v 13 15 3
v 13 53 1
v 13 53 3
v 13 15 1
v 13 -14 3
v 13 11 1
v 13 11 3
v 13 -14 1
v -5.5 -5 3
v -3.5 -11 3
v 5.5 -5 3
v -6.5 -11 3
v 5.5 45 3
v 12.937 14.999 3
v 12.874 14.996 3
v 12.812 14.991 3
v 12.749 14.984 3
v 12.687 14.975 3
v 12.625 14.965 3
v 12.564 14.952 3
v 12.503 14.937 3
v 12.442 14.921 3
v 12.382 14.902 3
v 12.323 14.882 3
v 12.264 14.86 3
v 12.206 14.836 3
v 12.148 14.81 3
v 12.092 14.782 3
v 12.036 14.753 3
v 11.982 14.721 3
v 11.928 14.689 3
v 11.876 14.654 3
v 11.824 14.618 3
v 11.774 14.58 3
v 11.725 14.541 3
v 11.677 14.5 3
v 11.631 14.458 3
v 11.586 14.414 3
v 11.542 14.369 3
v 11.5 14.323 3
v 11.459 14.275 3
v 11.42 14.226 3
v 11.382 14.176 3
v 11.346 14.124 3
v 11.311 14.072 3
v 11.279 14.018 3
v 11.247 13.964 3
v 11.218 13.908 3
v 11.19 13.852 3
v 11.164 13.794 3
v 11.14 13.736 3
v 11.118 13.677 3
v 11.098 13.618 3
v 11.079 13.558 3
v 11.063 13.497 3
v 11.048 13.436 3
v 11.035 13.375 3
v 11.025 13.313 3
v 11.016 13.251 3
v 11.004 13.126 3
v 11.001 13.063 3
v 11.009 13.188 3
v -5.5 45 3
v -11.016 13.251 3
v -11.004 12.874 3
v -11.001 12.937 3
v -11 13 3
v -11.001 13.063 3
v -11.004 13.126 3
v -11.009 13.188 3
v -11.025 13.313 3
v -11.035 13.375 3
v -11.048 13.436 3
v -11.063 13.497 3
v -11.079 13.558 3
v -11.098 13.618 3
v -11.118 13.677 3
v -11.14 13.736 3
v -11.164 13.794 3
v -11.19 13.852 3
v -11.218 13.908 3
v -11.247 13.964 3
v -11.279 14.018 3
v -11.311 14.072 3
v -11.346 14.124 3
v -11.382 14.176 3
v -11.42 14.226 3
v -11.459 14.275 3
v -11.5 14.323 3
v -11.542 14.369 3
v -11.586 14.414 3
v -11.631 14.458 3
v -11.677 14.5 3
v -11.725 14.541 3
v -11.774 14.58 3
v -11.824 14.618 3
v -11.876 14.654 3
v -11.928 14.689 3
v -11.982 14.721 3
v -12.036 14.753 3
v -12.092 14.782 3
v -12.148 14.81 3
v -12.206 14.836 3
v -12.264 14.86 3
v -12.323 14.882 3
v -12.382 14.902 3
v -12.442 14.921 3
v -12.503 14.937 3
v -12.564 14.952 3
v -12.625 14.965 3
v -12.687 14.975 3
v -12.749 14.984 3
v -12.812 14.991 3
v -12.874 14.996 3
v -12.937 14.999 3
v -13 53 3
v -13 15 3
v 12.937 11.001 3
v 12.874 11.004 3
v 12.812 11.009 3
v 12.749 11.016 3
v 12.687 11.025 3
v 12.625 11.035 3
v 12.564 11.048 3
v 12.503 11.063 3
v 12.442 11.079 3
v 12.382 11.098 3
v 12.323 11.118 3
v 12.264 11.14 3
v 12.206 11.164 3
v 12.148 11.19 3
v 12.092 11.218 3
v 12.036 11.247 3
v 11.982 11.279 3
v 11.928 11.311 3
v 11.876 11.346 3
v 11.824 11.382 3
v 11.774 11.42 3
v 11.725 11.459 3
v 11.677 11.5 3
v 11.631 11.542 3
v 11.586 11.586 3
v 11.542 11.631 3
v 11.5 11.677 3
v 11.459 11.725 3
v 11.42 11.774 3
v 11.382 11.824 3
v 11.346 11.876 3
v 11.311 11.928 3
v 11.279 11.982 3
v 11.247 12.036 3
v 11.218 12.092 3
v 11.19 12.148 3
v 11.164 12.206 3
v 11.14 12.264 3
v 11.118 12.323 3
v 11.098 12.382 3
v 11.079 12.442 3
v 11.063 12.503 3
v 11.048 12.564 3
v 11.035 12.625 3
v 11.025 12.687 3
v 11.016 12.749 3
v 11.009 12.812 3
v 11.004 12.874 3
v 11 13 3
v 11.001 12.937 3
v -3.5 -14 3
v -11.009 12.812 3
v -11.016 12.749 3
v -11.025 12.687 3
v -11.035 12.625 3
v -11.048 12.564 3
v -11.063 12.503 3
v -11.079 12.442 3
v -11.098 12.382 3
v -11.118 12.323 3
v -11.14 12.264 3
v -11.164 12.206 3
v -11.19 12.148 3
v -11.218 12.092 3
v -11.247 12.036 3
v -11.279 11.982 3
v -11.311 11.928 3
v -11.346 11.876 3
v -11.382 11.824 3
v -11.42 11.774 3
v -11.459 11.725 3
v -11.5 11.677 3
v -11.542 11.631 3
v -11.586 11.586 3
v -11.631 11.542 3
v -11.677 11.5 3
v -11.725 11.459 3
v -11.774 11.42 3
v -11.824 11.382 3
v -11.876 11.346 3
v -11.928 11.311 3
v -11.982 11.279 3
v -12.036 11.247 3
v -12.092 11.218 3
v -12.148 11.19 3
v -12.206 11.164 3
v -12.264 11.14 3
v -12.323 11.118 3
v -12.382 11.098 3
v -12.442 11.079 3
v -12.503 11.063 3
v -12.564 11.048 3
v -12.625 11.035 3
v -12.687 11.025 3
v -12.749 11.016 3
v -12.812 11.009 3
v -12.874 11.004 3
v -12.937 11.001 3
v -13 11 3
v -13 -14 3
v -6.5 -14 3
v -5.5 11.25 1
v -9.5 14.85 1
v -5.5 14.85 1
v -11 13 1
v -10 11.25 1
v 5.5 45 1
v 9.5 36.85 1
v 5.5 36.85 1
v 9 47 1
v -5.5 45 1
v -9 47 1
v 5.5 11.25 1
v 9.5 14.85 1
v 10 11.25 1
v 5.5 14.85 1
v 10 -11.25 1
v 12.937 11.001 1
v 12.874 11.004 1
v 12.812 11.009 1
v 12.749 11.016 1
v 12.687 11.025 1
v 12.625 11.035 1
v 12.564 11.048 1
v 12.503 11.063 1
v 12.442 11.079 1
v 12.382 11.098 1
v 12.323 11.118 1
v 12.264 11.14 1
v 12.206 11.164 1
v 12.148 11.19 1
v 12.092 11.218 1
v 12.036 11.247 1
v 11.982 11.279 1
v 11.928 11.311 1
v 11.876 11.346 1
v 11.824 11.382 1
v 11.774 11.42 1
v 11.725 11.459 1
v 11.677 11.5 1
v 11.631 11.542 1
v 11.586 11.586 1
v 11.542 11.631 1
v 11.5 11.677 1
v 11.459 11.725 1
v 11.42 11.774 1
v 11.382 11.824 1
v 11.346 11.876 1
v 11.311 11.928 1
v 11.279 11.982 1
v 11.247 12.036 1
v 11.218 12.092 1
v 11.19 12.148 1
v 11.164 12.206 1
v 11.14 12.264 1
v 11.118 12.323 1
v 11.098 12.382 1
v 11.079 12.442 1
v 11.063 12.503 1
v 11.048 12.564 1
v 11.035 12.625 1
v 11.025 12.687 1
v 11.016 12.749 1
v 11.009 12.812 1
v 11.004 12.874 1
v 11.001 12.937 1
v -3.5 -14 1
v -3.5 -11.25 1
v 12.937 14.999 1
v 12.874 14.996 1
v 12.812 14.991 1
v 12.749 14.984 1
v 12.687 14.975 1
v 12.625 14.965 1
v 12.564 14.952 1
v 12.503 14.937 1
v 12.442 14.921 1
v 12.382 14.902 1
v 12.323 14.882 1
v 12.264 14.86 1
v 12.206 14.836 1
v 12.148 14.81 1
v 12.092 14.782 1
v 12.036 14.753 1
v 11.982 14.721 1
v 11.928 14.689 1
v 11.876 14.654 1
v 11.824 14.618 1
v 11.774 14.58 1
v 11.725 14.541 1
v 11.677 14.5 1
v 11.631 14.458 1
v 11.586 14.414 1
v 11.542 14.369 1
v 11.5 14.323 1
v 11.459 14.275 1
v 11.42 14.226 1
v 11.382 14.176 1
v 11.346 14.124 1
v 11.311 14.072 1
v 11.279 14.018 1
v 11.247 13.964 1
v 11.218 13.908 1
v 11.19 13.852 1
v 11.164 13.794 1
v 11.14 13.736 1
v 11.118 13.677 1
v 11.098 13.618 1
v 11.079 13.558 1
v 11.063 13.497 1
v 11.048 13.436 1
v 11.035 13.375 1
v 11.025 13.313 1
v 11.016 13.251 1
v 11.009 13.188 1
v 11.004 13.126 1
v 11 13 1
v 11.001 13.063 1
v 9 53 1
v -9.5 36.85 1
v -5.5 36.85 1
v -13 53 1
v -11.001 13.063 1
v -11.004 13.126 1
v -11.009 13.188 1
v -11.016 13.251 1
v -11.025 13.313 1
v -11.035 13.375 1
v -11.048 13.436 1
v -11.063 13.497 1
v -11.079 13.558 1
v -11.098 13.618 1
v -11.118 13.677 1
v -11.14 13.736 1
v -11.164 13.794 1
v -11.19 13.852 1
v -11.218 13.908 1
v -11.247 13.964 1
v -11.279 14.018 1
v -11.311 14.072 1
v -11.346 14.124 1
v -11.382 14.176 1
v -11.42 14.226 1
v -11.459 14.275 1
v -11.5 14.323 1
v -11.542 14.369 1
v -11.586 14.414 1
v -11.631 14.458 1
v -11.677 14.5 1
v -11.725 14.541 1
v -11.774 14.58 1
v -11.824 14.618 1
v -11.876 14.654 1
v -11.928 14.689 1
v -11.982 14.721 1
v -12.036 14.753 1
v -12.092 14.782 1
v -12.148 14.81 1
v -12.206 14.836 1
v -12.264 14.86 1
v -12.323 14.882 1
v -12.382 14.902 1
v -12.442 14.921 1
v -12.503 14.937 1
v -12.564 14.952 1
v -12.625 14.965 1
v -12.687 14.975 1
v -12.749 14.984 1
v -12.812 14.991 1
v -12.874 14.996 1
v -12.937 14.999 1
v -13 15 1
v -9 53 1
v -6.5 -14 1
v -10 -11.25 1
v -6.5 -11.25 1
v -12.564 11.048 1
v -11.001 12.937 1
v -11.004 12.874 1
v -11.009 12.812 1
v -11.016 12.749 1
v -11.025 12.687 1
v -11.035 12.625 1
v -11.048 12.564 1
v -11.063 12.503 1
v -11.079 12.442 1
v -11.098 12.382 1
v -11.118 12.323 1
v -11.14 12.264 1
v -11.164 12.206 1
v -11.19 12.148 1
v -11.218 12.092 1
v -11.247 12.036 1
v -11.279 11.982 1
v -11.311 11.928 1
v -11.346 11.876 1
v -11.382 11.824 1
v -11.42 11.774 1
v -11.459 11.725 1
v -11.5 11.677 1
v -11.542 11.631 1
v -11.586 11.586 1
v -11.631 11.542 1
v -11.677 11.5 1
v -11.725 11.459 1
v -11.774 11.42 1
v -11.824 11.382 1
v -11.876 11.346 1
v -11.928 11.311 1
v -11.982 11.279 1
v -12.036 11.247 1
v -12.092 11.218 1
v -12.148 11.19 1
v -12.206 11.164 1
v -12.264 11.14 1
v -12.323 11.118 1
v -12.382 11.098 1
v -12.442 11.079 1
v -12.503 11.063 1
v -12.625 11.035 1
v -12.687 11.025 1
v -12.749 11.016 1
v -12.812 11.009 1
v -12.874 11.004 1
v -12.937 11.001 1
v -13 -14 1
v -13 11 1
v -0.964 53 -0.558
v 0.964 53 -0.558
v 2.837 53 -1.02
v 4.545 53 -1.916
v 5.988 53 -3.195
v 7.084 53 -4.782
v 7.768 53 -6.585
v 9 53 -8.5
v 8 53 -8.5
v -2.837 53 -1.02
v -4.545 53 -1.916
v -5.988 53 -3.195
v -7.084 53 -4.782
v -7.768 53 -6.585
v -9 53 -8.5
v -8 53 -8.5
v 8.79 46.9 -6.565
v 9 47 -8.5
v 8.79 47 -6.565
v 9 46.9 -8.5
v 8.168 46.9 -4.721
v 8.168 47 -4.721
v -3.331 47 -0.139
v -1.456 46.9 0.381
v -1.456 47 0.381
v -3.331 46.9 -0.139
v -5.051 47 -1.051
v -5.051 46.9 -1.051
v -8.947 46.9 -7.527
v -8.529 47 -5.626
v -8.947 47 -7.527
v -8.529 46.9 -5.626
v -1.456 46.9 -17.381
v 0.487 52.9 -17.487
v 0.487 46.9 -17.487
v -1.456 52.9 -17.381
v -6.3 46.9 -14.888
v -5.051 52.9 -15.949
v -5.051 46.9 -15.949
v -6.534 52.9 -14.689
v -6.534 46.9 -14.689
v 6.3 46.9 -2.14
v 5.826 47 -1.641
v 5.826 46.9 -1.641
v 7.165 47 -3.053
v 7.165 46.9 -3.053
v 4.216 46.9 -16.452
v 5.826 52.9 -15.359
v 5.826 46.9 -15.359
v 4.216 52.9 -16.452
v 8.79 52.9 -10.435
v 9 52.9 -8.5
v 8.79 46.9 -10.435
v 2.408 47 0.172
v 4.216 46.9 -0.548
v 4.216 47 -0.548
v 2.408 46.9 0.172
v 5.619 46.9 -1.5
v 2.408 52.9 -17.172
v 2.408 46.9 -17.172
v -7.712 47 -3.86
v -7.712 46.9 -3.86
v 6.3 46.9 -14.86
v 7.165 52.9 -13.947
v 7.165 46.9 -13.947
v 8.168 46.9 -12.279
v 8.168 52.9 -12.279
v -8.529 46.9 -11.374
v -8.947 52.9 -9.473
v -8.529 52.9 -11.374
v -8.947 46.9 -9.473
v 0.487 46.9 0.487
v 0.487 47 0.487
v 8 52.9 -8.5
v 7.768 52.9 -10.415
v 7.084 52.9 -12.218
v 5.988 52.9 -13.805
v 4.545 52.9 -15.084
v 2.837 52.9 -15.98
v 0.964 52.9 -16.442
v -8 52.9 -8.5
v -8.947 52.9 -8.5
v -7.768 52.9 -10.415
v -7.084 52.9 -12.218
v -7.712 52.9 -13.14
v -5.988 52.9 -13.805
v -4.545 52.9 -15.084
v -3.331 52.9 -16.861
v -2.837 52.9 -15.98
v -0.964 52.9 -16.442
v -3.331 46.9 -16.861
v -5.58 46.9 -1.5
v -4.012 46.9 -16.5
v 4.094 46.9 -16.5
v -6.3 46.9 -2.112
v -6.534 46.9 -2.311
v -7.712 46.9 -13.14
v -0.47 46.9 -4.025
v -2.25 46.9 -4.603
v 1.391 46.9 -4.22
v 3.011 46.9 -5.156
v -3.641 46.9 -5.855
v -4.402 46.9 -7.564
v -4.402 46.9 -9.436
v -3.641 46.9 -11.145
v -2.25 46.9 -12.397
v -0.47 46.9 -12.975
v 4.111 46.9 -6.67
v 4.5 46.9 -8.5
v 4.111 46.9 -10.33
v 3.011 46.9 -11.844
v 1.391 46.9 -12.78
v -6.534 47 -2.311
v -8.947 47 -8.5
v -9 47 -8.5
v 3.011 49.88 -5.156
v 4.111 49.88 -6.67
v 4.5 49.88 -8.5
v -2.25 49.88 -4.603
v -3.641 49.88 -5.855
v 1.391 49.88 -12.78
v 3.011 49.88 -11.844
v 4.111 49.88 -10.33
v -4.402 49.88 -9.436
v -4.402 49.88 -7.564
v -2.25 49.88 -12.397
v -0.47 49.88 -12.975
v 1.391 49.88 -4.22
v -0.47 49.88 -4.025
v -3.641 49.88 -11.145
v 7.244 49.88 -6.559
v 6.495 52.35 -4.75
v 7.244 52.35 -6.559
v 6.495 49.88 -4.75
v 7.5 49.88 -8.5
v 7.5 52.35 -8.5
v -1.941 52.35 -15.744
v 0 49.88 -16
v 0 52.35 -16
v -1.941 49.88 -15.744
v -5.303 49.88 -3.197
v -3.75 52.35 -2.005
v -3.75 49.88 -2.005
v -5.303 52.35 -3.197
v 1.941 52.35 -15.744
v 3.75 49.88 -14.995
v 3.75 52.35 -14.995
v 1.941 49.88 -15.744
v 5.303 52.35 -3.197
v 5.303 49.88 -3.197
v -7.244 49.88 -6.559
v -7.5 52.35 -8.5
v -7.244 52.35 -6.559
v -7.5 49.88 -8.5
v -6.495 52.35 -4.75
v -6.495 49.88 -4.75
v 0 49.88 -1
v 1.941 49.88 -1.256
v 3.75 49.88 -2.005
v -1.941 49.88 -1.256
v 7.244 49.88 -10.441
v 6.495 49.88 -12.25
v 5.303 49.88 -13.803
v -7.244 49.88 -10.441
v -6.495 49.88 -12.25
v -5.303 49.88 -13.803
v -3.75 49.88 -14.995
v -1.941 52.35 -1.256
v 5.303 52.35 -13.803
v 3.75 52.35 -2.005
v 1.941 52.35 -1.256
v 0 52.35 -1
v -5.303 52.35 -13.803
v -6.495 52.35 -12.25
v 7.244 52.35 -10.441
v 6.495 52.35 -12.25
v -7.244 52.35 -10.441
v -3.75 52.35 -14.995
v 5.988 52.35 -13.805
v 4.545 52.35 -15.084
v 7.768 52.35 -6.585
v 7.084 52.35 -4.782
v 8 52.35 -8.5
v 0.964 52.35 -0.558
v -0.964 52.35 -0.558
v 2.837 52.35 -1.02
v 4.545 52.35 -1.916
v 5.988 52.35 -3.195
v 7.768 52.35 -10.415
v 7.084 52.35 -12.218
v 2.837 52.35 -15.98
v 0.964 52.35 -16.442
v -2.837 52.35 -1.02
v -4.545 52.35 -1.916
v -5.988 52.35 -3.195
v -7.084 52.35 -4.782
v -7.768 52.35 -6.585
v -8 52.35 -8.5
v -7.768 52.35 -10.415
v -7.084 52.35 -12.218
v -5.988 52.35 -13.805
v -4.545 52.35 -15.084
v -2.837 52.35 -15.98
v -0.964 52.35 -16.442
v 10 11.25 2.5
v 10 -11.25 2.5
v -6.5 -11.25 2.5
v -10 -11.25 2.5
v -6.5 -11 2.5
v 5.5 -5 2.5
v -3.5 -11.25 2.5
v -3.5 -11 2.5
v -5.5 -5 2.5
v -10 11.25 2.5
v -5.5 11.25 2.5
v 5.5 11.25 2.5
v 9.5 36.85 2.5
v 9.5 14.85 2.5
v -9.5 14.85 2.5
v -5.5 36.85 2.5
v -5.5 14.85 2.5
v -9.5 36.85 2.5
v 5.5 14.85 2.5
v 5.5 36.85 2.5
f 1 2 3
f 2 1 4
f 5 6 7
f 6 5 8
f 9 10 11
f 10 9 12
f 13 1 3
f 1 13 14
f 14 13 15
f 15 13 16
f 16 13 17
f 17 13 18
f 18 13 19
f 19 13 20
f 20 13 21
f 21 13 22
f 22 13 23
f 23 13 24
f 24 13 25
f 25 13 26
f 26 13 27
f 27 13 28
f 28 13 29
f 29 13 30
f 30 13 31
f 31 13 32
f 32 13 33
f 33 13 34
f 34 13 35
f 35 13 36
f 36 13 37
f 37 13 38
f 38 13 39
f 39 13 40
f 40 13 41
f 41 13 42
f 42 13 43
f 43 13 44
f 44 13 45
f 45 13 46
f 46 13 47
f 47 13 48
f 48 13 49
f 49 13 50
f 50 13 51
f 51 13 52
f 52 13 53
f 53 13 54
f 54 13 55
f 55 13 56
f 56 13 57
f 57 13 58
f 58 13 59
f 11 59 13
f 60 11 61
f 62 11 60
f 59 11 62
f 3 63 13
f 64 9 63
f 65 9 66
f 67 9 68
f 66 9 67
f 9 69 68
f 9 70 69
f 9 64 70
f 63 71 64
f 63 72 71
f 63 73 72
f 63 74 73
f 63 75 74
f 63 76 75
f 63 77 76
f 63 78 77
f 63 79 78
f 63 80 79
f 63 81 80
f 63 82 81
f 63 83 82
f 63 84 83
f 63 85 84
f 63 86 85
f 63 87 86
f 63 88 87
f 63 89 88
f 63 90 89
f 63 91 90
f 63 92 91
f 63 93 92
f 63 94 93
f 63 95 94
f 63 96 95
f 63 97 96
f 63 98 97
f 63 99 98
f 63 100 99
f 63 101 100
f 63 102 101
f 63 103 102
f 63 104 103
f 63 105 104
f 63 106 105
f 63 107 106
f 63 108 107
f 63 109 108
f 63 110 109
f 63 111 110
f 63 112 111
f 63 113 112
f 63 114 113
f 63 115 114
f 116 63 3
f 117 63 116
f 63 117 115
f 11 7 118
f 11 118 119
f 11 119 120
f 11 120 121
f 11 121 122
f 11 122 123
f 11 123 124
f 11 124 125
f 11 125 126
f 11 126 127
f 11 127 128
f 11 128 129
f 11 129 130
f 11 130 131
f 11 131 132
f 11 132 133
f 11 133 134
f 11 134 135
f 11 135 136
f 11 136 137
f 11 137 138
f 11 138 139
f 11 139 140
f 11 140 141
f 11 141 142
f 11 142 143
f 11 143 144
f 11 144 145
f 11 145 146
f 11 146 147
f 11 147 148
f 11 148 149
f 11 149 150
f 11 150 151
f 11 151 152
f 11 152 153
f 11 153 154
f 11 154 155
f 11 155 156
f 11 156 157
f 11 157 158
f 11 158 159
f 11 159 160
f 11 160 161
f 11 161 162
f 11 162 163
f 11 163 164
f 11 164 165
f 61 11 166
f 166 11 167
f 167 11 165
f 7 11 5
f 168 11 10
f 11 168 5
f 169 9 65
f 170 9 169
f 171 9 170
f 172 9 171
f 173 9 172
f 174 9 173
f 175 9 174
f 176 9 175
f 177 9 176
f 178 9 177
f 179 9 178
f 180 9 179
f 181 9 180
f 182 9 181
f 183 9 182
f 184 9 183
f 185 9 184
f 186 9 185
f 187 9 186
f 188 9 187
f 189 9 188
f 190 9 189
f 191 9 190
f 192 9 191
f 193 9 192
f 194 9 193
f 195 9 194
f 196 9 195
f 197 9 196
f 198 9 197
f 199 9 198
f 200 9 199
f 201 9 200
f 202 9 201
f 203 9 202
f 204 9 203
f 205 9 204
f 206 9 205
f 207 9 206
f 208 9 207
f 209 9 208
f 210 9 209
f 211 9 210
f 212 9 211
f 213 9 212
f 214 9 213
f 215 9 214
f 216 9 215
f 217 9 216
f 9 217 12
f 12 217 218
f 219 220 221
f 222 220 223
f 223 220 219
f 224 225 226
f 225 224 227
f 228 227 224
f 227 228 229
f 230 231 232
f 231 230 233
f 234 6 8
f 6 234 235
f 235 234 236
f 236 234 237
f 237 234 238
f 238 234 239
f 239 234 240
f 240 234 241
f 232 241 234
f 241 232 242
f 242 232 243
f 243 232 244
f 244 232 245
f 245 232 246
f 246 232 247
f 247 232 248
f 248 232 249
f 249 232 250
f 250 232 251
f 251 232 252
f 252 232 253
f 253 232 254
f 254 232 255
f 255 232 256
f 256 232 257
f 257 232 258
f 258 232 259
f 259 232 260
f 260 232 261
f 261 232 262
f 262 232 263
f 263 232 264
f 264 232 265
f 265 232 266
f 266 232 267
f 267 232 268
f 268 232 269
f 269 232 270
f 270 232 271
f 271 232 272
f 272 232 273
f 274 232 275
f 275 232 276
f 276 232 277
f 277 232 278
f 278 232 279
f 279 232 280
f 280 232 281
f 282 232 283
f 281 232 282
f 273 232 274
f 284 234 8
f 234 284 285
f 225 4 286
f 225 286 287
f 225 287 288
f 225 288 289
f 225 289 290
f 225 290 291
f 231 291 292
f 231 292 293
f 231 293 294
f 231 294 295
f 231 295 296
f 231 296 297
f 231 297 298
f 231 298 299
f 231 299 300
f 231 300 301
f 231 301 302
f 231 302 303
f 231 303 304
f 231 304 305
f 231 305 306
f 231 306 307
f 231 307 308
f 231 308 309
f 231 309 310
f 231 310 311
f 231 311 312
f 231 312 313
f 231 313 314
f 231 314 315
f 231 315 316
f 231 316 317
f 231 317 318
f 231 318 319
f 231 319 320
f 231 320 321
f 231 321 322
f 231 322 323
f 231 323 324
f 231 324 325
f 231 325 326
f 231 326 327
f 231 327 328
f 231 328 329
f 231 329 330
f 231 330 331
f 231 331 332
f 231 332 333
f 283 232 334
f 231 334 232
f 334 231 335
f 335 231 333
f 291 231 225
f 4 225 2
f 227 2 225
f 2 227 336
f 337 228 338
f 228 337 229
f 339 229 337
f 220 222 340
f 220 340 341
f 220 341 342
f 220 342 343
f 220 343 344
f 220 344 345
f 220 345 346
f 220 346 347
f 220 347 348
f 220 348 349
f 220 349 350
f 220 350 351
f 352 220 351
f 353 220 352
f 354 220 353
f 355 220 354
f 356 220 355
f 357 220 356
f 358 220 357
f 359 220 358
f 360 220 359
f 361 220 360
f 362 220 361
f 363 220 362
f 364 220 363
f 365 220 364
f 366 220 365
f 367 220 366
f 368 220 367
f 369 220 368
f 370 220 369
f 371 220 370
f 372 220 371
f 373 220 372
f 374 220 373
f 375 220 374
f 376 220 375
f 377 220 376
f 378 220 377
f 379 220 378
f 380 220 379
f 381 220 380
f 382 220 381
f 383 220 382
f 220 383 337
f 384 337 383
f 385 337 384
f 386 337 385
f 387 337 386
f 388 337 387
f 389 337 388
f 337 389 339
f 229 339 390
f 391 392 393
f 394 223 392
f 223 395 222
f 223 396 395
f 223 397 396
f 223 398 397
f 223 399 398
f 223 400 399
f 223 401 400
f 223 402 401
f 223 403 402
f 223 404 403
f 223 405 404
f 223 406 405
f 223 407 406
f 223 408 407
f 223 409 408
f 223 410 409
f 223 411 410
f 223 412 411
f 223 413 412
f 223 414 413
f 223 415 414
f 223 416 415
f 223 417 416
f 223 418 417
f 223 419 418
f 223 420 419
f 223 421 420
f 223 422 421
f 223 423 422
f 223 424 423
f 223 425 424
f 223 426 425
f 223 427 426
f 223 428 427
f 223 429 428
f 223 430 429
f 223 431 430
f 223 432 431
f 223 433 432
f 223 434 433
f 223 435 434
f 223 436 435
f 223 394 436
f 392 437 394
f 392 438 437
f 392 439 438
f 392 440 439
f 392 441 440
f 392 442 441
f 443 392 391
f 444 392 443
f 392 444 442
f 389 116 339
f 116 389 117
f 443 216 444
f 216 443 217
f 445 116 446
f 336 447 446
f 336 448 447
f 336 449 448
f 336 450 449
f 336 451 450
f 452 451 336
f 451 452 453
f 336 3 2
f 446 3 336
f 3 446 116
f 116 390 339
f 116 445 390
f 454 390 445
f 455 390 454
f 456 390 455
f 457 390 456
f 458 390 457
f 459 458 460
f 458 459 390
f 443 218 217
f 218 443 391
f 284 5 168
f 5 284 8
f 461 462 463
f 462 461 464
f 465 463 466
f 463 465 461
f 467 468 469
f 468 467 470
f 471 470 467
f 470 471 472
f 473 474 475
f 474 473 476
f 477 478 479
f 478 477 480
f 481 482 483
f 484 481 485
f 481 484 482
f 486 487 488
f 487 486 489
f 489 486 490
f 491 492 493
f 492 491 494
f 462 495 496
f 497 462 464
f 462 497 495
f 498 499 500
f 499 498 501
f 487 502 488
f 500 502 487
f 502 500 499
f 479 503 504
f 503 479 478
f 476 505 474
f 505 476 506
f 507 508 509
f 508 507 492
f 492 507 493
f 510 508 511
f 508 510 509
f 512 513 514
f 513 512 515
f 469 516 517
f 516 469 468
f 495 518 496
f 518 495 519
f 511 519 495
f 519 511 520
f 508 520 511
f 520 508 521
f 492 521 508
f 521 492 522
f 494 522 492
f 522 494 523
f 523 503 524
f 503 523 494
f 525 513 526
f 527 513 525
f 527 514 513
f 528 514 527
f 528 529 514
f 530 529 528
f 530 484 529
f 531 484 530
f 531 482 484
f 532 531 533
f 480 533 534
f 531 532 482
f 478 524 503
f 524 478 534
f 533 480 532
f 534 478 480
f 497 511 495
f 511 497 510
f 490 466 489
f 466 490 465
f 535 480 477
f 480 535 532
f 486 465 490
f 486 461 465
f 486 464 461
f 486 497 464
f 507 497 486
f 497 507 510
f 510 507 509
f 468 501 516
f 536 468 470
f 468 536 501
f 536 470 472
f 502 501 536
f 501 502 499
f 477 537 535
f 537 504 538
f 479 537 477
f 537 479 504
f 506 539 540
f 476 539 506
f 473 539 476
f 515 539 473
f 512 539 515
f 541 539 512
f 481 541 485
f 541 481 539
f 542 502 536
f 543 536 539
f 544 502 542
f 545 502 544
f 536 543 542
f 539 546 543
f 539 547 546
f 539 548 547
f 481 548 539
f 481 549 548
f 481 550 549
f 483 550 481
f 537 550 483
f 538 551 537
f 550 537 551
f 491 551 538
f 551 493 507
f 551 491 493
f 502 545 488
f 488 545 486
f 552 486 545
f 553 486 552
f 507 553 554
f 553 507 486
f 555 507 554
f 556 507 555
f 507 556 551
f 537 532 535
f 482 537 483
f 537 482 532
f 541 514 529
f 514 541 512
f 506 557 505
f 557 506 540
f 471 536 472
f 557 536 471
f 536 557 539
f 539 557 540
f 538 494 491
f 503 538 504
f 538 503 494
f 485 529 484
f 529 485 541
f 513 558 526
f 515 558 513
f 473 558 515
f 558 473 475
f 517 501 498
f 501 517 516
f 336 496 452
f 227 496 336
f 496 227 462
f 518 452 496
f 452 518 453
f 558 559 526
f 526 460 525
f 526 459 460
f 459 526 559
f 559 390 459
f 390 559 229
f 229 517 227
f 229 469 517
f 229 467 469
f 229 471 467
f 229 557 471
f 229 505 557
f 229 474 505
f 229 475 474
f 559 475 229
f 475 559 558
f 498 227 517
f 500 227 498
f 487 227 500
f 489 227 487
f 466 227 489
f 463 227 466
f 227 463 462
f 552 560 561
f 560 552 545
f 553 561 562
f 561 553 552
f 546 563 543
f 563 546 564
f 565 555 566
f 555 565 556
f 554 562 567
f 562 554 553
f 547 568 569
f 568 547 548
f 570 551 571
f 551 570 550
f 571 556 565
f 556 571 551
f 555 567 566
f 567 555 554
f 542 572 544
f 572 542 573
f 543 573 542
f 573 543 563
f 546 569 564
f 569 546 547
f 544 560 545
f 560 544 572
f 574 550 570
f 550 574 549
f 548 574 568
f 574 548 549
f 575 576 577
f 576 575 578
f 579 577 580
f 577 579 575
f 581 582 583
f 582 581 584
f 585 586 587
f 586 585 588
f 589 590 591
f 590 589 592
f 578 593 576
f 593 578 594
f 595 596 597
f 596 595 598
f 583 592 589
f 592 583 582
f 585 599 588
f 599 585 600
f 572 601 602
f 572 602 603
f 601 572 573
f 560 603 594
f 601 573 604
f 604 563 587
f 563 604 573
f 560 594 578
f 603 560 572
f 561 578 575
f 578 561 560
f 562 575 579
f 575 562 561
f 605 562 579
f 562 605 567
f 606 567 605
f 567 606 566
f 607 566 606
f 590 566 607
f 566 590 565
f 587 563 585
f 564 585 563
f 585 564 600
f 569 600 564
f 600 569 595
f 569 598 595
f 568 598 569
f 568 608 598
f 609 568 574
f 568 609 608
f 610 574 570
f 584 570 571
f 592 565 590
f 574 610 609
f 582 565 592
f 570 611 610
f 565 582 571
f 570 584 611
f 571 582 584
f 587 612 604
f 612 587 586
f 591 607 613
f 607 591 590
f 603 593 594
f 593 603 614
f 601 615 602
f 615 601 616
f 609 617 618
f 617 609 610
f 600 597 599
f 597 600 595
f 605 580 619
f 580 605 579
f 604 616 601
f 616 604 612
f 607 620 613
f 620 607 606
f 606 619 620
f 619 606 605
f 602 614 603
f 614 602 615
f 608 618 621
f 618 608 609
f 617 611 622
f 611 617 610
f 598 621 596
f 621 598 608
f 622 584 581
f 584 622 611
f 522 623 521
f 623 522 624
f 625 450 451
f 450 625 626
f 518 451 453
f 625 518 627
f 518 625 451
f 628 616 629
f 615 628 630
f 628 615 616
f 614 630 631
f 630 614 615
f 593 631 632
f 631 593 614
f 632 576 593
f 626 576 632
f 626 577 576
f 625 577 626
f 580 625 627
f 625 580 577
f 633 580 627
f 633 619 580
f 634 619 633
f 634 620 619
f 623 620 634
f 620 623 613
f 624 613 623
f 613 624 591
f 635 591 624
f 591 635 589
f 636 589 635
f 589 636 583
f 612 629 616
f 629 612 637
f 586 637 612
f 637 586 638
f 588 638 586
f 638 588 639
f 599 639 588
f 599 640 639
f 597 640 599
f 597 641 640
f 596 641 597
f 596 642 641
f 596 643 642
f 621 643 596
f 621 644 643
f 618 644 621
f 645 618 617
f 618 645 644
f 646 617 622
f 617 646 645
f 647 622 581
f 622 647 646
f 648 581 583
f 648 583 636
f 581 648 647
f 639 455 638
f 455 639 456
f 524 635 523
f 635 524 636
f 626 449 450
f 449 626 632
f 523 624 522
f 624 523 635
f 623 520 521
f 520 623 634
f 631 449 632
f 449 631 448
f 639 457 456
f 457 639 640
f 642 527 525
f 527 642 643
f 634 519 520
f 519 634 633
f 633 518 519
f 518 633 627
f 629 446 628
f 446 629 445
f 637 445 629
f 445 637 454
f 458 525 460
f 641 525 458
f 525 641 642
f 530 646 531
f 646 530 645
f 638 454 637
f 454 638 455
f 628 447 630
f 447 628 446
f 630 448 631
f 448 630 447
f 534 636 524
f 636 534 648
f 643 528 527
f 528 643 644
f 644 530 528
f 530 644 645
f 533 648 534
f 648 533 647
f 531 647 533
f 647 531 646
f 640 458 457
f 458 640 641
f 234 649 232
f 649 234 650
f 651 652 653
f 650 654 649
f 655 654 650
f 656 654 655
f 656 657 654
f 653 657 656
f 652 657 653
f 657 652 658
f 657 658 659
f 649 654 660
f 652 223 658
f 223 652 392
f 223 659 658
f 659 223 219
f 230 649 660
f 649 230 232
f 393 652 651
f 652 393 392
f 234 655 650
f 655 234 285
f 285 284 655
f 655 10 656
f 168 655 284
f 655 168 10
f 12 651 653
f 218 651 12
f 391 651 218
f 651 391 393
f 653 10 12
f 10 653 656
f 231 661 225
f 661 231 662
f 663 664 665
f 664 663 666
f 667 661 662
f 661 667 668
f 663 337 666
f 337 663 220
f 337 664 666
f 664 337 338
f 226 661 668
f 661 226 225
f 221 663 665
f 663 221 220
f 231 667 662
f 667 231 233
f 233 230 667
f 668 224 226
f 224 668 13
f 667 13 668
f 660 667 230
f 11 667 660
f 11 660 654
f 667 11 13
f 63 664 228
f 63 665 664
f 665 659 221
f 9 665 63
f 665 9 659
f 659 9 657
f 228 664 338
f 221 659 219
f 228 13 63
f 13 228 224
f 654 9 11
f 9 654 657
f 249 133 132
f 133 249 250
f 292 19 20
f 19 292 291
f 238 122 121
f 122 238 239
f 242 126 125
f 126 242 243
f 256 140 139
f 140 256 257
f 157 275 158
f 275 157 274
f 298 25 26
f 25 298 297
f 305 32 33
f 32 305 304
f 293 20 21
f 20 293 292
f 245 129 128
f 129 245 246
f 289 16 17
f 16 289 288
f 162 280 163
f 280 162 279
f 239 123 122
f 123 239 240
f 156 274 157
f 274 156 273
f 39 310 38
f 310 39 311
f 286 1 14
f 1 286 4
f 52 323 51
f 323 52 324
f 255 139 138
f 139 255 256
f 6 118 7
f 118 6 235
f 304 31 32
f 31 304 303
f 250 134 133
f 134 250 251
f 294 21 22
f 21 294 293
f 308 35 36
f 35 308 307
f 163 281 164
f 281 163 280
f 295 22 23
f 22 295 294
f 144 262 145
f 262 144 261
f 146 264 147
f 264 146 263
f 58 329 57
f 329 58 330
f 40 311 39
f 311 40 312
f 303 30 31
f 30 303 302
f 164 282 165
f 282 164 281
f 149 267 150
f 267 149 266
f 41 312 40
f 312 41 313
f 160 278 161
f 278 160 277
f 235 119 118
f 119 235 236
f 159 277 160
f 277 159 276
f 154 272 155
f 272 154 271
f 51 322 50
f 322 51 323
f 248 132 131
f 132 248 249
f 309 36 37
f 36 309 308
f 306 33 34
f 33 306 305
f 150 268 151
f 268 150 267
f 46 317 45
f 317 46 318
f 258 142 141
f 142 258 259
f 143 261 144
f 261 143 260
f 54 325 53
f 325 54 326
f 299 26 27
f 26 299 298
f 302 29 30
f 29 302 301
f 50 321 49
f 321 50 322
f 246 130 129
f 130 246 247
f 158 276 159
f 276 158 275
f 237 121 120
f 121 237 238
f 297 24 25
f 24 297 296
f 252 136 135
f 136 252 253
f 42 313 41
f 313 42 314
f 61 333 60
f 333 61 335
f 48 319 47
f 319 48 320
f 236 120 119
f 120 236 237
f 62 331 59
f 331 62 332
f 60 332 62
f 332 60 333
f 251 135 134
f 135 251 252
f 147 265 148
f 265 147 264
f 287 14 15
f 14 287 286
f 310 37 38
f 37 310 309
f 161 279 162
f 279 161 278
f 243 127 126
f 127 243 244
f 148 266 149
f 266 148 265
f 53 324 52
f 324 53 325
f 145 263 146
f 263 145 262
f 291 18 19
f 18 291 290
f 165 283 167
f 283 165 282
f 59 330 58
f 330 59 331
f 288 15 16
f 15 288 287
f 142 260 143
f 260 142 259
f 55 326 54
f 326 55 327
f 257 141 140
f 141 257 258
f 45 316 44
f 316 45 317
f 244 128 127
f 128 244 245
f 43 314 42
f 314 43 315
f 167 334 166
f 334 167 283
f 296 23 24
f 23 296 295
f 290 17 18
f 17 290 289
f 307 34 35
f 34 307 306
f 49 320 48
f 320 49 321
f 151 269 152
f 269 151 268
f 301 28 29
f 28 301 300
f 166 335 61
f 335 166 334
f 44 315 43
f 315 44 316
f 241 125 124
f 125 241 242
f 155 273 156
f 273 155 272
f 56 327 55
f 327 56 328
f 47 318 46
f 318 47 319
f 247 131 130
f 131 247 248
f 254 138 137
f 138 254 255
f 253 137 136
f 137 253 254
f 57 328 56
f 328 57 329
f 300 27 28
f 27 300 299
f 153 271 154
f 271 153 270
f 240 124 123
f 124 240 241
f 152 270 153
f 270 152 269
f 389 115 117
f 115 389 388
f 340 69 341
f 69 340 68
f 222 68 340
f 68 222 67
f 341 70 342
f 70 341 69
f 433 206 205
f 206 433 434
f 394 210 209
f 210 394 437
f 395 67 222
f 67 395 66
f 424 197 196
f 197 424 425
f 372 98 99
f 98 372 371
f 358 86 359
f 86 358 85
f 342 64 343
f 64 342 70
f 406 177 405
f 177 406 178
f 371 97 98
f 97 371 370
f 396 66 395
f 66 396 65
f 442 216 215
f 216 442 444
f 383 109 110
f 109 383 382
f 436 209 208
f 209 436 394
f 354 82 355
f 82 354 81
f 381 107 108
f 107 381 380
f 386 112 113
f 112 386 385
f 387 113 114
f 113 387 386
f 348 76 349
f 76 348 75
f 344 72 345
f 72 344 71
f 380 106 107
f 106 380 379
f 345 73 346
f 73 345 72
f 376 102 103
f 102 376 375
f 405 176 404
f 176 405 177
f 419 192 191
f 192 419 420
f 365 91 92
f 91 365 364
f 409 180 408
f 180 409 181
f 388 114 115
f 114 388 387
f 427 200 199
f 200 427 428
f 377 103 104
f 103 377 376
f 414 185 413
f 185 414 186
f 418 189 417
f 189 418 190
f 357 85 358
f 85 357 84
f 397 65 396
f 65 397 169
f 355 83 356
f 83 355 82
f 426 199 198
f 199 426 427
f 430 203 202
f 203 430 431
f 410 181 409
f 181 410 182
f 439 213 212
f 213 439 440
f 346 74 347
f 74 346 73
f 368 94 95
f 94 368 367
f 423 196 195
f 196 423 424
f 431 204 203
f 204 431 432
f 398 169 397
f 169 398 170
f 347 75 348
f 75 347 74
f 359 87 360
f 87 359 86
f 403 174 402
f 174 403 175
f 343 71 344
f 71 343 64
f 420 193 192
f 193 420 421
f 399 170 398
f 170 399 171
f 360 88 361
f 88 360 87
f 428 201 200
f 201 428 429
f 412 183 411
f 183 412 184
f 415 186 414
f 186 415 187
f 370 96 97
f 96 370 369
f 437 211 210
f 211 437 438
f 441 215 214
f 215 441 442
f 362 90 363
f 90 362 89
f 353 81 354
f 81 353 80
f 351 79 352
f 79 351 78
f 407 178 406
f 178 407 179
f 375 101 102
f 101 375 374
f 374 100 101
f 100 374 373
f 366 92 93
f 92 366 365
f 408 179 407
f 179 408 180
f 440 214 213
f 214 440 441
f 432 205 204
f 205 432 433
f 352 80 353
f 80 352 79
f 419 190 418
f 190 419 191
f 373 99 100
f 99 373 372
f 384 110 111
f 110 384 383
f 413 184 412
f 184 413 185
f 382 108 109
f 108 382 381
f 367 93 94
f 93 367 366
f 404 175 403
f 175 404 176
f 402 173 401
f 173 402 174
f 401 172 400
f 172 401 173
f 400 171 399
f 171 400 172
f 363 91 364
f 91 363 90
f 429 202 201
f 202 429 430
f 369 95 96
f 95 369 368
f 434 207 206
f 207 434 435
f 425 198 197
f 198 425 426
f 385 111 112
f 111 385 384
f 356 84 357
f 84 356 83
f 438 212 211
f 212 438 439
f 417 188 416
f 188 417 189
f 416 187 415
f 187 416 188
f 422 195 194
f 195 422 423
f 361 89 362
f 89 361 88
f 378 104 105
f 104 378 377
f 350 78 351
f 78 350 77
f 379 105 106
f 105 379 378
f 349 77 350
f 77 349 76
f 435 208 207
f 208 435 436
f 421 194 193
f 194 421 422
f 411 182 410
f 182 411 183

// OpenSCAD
module parts() {
	color([0.5,0.7,0.7]){
		cube([20,22.5,5], center=true);
		translate([-5,-17,0.5])cube([3,12,6], center=true);
		translate([0,22.25+3.6,0])cube([19,22,5], center=true);
		
		//camera
		translate([0,0,-4])union(){
			translate([0,39.9+4,-5])cube([12.6, 6, 15], center=true);
			translate([0,39.9+10,-4.5])rotate([90,0,0])cylinder(r=4.5,h=3.10);
		}

		translate([0,0,-4])union(){
			translate([0,39.9+12.48,-4.5])rotate([90,0,0])cylinder(r=15/2,h=2.5);
			translate([0,39.9+15.45,-4.5])rotate([90,0,0])cylinder(r=16/2,h=3);
		}


	}	
}

difference(){
	union(){
		translate([0,19.5,2])cube([26,67,2],center=true);
		translate([0,39.9+13,-8.5])rotate([90,0,0])cylinder(r=9,h=6.0);

		translate([0,50,-3.5])cube([18,6,10],center=true);
	}
	translate([0,20,0])cube([11,50,9],center=true);
	translate([13,13,2.5])cylinder(r=2,h=5, center=true, $fn=200);
	translate([-13,13,2.5])cylinder(r=2,h=5, center=true, $fn=200);
	parts();
}

//parts();
